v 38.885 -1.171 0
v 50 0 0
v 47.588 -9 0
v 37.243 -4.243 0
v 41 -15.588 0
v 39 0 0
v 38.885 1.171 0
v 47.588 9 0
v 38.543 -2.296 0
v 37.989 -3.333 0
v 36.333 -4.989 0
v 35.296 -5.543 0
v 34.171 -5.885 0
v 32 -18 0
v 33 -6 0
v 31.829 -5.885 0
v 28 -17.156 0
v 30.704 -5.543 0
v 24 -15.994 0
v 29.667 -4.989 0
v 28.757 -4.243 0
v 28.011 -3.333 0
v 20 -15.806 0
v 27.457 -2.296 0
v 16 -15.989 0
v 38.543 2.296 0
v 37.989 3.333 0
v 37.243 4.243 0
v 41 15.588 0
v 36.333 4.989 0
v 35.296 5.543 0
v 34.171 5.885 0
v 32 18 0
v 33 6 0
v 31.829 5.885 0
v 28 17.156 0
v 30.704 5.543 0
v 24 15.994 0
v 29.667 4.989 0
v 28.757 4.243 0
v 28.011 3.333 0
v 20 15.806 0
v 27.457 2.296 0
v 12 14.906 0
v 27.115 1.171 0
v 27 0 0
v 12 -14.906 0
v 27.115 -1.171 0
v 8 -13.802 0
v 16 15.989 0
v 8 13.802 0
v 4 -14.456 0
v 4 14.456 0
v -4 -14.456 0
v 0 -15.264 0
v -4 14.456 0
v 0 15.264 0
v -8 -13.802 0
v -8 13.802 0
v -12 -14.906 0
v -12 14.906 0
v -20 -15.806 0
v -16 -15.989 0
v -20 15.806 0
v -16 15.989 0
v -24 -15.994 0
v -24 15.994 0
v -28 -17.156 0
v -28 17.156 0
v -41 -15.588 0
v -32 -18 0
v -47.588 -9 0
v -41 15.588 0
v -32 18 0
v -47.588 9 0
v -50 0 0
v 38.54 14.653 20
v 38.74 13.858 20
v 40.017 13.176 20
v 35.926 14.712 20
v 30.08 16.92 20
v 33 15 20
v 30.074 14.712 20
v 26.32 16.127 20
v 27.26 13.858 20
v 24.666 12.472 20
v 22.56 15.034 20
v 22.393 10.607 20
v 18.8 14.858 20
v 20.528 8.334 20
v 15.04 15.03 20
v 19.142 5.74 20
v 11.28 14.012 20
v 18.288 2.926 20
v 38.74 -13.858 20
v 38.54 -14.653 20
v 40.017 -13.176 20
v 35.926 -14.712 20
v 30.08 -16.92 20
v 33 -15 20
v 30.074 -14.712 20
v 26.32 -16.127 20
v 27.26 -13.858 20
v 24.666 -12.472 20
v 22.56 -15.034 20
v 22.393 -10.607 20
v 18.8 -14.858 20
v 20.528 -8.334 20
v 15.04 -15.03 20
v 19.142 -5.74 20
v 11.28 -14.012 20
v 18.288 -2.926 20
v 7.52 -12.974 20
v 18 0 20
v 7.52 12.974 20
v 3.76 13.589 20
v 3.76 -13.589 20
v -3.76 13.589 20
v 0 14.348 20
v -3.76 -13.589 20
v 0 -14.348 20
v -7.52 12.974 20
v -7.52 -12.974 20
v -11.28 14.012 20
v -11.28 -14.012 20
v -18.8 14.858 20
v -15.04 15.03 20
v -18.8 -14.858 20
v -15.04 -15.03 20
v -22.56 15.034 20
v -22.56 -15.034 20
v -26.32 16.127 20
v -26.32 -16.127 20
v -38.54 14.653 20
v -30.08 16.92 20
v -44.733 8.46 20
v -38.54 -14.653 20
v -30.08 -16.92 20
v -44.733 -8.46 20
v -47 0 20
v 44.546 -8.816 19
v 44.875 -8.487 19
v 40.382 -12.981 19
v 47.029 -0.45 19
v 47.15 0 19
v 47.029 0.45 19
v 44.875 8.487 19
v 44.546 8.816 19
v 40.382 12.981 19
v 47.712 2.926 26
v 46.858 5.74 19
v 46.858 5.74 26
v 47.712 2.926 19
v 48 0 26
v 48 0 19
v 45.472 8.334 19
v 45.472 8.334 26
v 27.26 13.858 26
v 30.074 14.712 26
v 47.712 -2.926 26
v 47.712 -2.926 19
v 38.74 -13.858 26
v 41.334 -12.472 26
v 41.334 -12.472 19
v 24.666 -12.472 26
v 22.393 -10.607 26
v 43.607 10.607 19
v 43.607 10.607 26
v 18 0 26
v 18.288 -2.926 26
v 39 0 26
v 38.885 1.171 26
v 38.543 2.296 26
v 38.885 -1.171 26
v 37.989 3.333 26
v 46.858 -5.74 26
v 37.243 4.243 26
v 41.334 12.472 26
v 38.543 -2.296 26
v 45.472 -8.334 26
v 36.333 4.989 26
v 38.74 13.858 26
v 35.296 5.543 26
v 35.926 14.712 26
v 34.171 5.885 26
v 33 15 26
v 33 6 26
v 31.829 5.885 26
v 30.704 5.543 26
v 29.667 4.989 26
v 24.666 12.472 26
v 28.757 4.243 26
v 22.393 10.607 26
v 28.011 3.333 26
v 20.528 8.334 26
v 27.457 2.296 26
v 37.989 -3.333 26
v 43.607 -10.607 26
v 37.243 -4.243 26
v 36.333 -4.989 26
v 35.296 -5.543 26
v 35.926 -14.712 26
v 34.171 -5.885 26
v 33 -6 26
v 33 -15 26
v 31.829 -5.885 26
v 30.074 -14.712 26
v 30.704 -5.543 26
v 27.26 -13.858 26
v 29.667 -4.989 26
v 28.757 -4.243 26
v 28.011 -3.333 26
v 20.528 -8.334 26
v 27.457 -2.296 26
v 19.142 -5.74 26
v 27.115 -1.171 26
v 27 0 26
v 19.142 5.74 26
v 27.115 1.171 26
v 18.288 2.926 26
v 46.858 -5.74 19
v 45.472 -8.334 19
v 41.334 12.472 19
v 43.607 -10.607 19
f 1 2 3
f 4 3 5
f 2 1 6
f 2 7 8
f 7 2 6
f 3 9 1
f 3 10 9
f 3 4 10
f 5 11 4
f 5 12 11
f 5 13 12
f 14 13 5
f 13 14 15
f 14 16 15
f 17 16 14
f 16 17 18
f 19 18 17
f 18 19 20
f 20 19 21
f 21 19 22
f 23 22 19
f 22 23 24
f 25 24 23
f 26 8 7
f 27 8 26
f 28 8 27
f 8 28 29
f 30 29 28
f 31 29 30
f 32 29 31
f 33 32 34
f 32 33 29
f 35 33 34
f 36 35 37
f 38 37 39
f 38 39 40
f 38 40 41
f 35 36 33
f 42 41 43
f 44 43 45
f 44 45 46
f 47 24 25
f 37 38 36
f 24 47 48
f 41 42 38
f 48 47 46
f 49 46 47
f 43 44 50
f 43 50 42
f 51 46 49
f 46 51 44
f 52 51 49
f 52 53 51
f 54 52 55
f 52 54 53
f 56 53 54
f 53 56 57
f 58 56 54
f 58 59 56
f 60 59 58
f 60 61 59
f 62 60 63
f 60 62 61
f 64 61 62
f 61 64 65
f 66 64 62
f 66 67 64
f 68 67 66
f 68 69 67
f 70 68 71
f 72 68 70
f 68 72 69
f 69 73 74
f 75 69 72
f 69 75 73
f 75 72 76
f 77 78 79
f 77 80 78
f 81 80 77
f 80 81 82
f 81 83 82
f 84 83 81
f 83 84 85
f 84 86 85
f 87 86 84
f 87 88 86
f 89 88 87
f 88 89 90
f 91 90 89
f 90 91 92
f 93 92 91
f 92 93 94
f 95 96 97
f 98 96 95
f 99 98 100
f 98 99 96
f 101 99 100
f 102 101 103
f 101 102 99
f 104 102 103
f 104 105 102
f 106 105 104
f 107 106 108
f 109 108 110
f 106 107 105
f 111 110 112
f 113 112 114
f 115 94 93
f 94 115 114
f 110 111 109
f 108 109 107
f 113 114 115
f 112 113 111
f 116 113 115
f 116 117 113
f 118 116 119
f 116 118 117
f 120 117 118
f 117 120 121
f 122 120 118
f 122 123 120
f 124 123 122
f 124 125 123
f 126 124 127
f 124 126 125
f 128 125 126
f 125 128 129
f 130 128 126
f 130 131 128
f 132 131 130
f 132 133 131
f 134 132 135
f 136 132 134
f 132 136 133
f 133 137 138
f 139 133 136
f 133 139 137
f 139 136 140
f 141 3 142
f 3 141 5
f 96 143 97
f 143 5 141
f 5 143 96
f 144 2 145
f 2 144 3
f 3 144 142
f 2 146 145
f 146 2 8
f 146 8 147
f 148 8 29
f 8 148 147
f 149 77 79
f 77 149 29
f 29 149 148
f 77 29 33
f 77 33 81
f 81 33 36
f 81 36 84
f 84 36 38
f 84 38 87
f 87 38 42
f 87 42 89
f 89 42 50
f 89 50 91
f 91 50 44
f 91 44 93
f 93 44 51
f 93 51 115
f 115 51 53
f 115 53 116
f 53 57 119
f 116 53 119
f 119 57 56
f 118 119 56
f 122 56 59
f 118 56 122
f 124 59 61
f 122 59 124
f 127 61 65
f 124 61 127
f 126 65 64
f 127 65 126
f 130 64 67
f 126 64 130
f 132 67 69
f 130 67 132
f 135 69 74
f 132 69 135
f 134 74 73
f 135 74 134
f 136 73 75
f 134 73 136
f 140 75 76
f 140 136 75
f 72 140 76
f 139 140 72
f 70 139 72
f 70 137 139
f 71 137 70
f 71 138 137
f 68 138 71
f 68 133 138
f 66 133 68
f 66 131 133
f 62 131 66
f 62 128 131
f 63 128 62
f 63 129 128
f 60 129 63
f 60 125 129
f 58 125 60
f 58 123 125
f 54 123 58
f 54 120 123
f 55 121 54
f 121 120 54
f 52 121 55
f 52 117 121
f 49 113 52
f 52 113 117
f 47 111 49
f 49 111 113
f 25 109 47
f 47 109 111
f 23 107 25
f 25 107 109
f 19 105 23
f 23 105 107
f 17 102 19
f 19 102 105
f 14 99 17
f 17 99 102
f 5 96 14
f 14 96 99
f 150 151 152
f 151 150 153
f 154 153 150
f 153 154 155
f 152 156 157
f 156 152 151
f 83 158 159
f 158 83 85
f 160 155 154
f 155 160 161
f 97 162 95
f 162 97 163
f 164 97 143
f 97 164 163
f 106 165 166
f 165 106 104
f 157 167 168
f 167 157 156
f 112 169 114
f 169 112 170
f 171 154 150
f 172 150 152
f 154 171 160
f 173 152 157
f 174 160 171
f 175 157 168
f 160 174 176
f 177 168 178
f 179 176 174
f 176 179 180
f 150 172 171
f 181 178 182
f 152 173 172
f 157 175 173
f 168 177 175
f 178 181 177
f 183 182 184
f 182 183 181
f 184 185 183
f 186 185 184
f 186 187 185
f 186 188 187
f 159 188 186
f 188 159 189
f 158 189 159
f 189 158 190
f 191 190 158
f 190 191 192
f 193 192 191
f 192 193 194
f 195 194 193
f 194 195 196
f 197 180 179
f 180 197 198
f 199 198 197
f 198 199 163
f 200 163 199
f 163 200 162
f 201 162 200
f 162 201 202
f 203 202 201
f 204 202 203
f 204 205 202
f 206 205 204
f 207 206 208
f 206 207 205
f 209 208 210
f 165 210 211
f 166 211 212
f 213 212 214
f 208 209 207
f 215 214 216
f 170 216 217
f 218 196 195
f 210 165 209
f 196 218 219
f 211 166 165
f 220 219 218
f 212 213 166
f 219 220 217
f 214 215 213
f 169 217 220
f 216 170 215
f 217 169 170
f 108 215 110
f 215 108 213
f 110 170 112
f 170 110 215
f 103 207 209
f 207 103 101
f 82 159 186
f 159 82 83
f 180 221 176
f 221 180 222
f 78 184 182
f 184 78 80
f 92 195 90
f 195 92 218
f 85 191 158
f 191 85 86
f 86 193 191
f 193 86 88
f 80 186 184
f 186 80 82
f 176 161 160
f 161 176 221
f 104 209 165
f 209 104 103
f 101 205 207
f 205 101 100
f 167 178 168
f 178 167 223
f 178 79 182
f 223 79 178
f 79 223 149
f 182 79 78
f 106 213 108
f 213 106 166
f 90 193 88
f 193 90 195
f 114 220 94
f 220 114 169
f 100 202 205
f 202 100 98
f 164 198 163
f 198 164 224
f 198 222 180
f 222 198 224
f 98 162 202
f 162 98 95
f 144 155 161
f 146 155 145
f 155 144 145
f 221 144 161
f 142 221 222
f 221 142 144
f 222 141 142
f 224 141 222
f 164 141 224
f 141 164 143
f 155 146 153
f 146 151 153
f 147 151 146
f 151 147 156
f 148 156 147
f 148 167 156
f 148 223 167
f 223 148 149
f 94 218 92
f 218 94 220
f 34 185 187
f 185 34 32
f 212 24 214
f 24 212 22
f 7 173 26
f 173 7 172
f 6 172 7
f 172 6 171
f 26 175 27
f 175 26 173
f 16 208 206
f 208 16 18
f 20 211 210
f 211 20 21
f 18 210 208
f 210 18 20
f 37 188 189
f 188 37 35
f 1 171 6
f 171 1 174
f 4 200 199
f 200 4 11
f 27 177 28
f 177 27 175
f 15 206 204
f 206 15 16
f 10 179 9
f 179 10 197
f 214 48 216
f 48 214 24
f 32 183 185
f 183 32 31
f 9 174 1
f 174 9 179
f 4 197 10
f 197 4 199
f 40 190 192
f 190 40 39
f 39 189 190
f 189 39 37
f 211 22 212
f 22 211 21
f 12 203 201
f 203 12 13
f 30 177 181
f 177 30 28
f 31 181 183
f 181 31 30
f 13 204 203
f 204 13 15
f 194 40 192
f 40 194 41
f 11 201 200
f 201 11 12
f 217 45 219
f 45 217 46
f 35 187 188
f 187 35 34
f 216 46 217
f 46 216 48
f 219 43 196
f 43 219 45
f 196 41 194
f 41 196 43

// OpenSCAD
$fn = 32;

// ----------------------------------------------------------------------
// Handle: 100 x 36 mm grip, 20 mm thick
// ----------------------------------------------------------------------

// --- parameters (mm) ---
length = 100;             // grip length
width = 36;               // grip width
thickness = 20;           // grip thickness
waist = 0.8;              // width factor at the middle
draft = 0.94;             // top face scale of the extrusion
scallops = 4;             // finger rests per side
ripple = 0.06;            // depth factor of the finger rests
boss_d = 30;              // mounting boss diameter
boss_h = 6;               // mounting boss height
boss_hole_d = 12;         // screw clearance through the boss
boss_r = 33;              // boss centre from the grip centre

/* ergonomic grip outline, closed spline-like polygon in the XY plane */
grip = [[-32, 18], [-28, 17.156], [-24, 15.994], [-20, 15.806], [-16, 15.989], [-12, 14.906], [-8, 13.802], [-4, 14.456], [0, 15.264], [4, 14.456], [8, 13.802], [12, 14.906], [16, 15.989], [20, 15.806], [24, 15.994], [28, 17.156], [32, 18], [41, 15.588], [47.588, 9], [50, 0], [47.588, -9], [41, -15.588], [32, -18], [32, -18], [28, -17.156], [24, -15.994], [20, -15.806], [16, -15.989], [12, -14.906], [8, -13.802], [4, -14.456], [0, -15.264], [-4, -14.456], [-8, -13.802], [-12, -14.906], [-16, -15.989], [-20, -15.806], [-24, -15.994], [-28, -17.156], [-32, -18], [-41, -15.588], [-47.588, -9], [-50, 0], [-47.588, 9], [-41, 15.588], [-32, 18]];

module grip_body() {
  linear_extrude(height = thickness, scale = draft) polygon(grip);
}

module boss_body() {
  /* sunk 1 mm into the grip so the joint overlaps */
  translate([boss_r, 0, thickness - 1]) cylinder(h = boss_h + 1, d = boss_d);
}

difference() {
  union() {
    grip_body();
    boss_body();
  }
  translate([boss_r, 0, -1]) cylinder(h = thickness + boss_h + 2, d = boss_hole_d);
}
